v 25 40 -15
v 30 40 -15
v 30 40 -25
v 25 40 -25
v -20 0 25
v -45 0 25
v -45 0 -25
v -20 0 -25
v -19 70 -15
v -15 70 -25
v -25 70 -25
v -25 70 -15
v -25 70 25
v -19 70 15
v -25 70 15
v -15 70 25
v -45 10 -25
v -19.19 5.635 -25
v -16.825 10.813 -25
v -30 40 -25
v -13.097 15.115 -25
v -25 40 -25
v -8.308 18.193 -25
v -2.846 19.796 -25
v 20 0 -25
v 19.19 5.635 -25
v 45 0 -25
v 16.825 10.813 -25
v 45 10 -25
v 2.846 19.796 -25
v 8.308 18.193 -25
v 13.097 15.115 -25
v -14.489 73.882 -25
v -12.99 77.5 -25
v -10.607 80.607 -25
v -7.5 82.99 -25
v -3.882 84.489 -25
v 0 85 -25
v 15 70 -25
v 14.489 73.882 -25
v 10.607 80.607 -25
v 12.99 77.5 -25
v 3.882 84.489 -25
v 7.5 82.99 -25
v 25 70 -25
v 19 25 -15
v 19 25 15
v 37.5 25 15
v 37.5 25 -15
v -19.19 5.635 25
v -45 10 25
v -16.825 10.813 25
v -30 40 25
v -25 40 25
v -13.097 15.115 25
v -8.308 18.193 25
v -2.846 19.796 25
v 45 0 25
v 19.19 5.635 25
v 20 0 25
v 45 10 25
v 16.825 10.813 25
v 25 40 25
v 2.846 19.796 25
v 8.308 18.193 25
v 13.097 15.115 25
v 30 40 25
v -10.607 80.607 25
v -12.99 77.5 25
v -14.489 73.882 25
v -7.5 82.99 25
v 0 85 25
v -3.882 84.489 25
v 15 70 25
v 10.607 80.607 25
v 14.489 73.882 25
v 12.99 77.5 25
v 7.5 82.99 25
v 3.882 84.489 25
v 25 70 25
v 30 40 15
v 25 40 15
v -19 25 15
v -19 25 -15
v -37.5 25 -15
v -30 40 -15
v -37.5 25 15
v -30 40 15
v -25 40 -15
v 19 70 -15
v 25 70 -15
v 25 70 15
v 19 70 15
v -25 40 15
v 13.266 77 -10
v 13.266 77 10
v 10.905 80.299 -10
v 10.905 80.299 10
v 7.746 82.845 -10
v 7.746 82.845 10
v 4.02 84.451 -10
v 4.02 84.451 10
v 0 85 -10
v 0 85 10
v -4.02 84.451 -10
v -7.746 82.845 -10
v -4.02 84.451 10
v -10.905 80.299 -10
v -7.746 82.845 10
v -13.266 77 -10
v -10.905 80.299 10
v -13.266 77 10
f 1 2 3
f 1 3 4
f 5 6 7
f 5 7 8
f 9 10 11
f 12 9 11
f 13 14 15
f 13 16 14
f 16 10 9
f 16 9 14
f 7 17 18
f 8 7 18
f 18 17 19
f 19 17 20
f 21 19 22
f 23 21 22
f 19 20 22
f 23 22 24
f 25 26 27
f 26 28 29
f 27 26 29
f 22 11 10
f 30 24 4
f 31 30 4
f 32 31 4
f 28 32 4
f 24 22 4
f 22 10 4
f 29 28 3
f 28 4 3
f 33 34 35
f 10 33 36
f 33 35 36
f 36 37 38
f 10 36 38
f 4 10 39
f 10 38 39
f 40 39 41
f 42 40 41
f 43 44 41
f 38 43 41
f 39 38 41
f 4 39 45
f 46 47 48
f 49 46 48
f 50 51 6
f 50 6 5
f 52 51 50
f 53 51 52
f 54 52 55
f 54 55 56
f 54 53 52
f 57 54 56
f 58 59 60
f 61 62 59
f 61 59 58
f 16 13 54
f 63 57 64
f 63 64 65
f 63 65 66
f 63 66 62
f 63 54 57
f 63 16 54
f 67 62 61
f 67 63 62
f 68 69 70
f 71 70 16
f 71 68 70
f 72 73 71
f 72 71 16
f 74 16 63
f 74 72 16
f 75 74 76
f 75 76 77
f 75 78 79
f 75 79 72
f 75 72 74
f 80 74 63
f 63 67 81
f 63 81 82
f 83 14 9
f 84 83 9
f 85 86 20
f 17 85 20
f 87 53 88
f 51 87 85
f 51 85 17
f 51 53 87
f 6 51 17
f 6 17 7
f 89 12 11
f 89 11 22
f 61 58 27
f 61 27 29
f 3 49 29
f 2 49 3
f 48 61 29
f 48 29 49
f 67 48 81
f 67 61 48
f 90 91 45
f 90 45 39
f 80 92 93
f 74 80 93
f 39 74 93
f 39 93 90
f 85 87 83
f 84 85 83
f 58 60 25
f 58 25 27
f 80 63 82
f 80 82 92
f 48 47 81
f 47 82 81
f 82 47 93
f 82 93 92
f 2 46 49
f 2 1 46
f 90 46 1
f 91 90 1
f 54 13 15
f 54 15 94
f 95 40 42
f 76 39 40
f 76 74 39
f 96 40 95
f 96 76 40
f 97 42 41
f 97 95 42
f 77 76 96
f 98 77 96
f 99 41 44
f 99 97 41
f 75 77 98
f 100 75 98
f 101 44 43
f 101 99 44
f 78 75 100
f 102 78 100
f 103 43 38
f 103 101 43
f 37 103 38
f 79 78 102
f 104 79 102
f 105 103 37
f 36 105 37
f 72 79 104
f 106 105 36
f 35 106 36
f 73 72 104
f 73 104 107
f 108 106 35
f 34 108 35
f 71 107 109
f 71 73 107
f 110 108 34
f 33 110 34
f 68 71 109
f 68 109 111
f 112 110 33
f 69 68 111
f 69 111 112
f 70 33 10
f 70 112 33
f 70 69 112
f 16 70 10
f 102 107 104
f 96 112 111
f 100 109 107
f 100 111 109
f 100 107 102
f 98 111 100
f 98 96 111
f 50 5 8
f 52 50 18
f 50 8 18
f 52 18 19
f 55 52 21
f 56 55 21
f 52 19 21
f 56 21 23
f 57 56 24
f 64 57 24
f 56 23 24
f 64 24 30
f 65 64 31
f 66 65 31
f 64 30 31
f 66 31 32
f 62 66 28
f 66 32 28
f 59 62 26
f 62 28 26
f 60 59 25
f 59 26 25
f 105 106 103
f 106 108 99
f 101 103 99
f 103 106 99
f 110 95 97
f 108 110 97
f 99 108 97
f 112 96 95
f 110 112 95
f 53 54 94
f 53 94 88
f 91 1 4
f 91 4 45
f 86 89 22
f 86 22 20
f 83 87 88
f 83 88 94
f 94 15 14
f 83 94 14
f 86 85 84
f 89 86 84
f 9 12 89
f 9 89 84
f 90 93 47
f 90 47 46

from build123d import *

# Parameters (mm, degrees)
BOSS_EXTRUDE2_DEPTH = 25
SKETCH6_W           = 20
SKETCH6_H           = 8
CUT_EXTRUDE1_DEPTH  = 25
CUT_EXTRUDE2_DEPTH  = 51
SKETCH11_W          = 26
SKETCH11_H          = 30
CUT_EXTRUDE3_DEPTH  = 45


with BuildPart() as part:
    # Sketch3 → Boss-Extrude2 (new body, symmetric)
    with BuildSketch(Plane.XY):
        with BuildLine():
            Line((0, 85), (0, 70))
            Line((0, 70), (15, 70))
            ThreePointArc((15, 70), (10.606601718, 80.606601718), (0, 85))
        make_face()
        with BuildLine():
            Line((-15, 70), (0, 70))
            Line((0, 70), (0, 85))
            ThreePointArc((0, 85), (-10.606601718, 80.606601718), (-15, 70))
        make_face()
        Polygon((0, 70), (0, 40), (25, 40), (25, 70), (15, 70), align=None)
        Polygon((-45, 0), (0, 0), (0, 40), (-25, 40), (-30, 40), (-45, 10), align=None)
        Polygon((0, 0), (45, 0), (45, 10), (30, 40), (25, 40), (0, 40), align=None)
        Polygon((-25, 40), (0, 40), (0, 70), (-15, 70), (-25, 70), align=None)
    extrude(amount=BOSS_EXTRUDE2_DEPTH, both=True)

    # Sketch6 → Cut-Extrude1 (cut, symmetric)
    with BuildSketch(Plane(origin=(0, 0, 0), x_dir=(0, 0, -1), z_dir=(1, 0, 0))):
        with Locations((0, 81)):
            Rectangle(SKETCH6_W, SKETCH6_H)
    extrude(amount=CUT_EXTRUDE1_DEPTH, both=True, mode=Mode.SUBTRACT)

    # Sketch7 → Cut-Extrude2 (cut, through all)
    with BuildSketch(Plane(origin=(0, 0, -25), x_dir=(-1, 0, 0), z_dir=(0, 0, -1))):
        with BuildLine():
            Line((-20, 0), (20, 0))
            ThreePointArc((20, 0), (0, 20), (-20, 0))
        make_face()
    extrude(amount=-CUT_EXTRUDE2_DEPTH, mode=Mode.SUBTRACT)

    # Sketch11 → Cut-Extrude3 (cut)
    with BuildSketch(Plane(origin=(0, 70, 0), x_dir=(1, 0, 0), z_dir=(0, 1, 0))):
        with Locations((-32, 0)):
            Rectangle(SKETCH11_W, SKETCH11_H)
        with Locations((32, 0)):
            Rectangle(SKETCH11_W, SKETCH11_H)
    extrude(amount=-CUT_EXTRUDE3_DEPTH, mode=Mode.SUBTRACT)


solid = part.part
